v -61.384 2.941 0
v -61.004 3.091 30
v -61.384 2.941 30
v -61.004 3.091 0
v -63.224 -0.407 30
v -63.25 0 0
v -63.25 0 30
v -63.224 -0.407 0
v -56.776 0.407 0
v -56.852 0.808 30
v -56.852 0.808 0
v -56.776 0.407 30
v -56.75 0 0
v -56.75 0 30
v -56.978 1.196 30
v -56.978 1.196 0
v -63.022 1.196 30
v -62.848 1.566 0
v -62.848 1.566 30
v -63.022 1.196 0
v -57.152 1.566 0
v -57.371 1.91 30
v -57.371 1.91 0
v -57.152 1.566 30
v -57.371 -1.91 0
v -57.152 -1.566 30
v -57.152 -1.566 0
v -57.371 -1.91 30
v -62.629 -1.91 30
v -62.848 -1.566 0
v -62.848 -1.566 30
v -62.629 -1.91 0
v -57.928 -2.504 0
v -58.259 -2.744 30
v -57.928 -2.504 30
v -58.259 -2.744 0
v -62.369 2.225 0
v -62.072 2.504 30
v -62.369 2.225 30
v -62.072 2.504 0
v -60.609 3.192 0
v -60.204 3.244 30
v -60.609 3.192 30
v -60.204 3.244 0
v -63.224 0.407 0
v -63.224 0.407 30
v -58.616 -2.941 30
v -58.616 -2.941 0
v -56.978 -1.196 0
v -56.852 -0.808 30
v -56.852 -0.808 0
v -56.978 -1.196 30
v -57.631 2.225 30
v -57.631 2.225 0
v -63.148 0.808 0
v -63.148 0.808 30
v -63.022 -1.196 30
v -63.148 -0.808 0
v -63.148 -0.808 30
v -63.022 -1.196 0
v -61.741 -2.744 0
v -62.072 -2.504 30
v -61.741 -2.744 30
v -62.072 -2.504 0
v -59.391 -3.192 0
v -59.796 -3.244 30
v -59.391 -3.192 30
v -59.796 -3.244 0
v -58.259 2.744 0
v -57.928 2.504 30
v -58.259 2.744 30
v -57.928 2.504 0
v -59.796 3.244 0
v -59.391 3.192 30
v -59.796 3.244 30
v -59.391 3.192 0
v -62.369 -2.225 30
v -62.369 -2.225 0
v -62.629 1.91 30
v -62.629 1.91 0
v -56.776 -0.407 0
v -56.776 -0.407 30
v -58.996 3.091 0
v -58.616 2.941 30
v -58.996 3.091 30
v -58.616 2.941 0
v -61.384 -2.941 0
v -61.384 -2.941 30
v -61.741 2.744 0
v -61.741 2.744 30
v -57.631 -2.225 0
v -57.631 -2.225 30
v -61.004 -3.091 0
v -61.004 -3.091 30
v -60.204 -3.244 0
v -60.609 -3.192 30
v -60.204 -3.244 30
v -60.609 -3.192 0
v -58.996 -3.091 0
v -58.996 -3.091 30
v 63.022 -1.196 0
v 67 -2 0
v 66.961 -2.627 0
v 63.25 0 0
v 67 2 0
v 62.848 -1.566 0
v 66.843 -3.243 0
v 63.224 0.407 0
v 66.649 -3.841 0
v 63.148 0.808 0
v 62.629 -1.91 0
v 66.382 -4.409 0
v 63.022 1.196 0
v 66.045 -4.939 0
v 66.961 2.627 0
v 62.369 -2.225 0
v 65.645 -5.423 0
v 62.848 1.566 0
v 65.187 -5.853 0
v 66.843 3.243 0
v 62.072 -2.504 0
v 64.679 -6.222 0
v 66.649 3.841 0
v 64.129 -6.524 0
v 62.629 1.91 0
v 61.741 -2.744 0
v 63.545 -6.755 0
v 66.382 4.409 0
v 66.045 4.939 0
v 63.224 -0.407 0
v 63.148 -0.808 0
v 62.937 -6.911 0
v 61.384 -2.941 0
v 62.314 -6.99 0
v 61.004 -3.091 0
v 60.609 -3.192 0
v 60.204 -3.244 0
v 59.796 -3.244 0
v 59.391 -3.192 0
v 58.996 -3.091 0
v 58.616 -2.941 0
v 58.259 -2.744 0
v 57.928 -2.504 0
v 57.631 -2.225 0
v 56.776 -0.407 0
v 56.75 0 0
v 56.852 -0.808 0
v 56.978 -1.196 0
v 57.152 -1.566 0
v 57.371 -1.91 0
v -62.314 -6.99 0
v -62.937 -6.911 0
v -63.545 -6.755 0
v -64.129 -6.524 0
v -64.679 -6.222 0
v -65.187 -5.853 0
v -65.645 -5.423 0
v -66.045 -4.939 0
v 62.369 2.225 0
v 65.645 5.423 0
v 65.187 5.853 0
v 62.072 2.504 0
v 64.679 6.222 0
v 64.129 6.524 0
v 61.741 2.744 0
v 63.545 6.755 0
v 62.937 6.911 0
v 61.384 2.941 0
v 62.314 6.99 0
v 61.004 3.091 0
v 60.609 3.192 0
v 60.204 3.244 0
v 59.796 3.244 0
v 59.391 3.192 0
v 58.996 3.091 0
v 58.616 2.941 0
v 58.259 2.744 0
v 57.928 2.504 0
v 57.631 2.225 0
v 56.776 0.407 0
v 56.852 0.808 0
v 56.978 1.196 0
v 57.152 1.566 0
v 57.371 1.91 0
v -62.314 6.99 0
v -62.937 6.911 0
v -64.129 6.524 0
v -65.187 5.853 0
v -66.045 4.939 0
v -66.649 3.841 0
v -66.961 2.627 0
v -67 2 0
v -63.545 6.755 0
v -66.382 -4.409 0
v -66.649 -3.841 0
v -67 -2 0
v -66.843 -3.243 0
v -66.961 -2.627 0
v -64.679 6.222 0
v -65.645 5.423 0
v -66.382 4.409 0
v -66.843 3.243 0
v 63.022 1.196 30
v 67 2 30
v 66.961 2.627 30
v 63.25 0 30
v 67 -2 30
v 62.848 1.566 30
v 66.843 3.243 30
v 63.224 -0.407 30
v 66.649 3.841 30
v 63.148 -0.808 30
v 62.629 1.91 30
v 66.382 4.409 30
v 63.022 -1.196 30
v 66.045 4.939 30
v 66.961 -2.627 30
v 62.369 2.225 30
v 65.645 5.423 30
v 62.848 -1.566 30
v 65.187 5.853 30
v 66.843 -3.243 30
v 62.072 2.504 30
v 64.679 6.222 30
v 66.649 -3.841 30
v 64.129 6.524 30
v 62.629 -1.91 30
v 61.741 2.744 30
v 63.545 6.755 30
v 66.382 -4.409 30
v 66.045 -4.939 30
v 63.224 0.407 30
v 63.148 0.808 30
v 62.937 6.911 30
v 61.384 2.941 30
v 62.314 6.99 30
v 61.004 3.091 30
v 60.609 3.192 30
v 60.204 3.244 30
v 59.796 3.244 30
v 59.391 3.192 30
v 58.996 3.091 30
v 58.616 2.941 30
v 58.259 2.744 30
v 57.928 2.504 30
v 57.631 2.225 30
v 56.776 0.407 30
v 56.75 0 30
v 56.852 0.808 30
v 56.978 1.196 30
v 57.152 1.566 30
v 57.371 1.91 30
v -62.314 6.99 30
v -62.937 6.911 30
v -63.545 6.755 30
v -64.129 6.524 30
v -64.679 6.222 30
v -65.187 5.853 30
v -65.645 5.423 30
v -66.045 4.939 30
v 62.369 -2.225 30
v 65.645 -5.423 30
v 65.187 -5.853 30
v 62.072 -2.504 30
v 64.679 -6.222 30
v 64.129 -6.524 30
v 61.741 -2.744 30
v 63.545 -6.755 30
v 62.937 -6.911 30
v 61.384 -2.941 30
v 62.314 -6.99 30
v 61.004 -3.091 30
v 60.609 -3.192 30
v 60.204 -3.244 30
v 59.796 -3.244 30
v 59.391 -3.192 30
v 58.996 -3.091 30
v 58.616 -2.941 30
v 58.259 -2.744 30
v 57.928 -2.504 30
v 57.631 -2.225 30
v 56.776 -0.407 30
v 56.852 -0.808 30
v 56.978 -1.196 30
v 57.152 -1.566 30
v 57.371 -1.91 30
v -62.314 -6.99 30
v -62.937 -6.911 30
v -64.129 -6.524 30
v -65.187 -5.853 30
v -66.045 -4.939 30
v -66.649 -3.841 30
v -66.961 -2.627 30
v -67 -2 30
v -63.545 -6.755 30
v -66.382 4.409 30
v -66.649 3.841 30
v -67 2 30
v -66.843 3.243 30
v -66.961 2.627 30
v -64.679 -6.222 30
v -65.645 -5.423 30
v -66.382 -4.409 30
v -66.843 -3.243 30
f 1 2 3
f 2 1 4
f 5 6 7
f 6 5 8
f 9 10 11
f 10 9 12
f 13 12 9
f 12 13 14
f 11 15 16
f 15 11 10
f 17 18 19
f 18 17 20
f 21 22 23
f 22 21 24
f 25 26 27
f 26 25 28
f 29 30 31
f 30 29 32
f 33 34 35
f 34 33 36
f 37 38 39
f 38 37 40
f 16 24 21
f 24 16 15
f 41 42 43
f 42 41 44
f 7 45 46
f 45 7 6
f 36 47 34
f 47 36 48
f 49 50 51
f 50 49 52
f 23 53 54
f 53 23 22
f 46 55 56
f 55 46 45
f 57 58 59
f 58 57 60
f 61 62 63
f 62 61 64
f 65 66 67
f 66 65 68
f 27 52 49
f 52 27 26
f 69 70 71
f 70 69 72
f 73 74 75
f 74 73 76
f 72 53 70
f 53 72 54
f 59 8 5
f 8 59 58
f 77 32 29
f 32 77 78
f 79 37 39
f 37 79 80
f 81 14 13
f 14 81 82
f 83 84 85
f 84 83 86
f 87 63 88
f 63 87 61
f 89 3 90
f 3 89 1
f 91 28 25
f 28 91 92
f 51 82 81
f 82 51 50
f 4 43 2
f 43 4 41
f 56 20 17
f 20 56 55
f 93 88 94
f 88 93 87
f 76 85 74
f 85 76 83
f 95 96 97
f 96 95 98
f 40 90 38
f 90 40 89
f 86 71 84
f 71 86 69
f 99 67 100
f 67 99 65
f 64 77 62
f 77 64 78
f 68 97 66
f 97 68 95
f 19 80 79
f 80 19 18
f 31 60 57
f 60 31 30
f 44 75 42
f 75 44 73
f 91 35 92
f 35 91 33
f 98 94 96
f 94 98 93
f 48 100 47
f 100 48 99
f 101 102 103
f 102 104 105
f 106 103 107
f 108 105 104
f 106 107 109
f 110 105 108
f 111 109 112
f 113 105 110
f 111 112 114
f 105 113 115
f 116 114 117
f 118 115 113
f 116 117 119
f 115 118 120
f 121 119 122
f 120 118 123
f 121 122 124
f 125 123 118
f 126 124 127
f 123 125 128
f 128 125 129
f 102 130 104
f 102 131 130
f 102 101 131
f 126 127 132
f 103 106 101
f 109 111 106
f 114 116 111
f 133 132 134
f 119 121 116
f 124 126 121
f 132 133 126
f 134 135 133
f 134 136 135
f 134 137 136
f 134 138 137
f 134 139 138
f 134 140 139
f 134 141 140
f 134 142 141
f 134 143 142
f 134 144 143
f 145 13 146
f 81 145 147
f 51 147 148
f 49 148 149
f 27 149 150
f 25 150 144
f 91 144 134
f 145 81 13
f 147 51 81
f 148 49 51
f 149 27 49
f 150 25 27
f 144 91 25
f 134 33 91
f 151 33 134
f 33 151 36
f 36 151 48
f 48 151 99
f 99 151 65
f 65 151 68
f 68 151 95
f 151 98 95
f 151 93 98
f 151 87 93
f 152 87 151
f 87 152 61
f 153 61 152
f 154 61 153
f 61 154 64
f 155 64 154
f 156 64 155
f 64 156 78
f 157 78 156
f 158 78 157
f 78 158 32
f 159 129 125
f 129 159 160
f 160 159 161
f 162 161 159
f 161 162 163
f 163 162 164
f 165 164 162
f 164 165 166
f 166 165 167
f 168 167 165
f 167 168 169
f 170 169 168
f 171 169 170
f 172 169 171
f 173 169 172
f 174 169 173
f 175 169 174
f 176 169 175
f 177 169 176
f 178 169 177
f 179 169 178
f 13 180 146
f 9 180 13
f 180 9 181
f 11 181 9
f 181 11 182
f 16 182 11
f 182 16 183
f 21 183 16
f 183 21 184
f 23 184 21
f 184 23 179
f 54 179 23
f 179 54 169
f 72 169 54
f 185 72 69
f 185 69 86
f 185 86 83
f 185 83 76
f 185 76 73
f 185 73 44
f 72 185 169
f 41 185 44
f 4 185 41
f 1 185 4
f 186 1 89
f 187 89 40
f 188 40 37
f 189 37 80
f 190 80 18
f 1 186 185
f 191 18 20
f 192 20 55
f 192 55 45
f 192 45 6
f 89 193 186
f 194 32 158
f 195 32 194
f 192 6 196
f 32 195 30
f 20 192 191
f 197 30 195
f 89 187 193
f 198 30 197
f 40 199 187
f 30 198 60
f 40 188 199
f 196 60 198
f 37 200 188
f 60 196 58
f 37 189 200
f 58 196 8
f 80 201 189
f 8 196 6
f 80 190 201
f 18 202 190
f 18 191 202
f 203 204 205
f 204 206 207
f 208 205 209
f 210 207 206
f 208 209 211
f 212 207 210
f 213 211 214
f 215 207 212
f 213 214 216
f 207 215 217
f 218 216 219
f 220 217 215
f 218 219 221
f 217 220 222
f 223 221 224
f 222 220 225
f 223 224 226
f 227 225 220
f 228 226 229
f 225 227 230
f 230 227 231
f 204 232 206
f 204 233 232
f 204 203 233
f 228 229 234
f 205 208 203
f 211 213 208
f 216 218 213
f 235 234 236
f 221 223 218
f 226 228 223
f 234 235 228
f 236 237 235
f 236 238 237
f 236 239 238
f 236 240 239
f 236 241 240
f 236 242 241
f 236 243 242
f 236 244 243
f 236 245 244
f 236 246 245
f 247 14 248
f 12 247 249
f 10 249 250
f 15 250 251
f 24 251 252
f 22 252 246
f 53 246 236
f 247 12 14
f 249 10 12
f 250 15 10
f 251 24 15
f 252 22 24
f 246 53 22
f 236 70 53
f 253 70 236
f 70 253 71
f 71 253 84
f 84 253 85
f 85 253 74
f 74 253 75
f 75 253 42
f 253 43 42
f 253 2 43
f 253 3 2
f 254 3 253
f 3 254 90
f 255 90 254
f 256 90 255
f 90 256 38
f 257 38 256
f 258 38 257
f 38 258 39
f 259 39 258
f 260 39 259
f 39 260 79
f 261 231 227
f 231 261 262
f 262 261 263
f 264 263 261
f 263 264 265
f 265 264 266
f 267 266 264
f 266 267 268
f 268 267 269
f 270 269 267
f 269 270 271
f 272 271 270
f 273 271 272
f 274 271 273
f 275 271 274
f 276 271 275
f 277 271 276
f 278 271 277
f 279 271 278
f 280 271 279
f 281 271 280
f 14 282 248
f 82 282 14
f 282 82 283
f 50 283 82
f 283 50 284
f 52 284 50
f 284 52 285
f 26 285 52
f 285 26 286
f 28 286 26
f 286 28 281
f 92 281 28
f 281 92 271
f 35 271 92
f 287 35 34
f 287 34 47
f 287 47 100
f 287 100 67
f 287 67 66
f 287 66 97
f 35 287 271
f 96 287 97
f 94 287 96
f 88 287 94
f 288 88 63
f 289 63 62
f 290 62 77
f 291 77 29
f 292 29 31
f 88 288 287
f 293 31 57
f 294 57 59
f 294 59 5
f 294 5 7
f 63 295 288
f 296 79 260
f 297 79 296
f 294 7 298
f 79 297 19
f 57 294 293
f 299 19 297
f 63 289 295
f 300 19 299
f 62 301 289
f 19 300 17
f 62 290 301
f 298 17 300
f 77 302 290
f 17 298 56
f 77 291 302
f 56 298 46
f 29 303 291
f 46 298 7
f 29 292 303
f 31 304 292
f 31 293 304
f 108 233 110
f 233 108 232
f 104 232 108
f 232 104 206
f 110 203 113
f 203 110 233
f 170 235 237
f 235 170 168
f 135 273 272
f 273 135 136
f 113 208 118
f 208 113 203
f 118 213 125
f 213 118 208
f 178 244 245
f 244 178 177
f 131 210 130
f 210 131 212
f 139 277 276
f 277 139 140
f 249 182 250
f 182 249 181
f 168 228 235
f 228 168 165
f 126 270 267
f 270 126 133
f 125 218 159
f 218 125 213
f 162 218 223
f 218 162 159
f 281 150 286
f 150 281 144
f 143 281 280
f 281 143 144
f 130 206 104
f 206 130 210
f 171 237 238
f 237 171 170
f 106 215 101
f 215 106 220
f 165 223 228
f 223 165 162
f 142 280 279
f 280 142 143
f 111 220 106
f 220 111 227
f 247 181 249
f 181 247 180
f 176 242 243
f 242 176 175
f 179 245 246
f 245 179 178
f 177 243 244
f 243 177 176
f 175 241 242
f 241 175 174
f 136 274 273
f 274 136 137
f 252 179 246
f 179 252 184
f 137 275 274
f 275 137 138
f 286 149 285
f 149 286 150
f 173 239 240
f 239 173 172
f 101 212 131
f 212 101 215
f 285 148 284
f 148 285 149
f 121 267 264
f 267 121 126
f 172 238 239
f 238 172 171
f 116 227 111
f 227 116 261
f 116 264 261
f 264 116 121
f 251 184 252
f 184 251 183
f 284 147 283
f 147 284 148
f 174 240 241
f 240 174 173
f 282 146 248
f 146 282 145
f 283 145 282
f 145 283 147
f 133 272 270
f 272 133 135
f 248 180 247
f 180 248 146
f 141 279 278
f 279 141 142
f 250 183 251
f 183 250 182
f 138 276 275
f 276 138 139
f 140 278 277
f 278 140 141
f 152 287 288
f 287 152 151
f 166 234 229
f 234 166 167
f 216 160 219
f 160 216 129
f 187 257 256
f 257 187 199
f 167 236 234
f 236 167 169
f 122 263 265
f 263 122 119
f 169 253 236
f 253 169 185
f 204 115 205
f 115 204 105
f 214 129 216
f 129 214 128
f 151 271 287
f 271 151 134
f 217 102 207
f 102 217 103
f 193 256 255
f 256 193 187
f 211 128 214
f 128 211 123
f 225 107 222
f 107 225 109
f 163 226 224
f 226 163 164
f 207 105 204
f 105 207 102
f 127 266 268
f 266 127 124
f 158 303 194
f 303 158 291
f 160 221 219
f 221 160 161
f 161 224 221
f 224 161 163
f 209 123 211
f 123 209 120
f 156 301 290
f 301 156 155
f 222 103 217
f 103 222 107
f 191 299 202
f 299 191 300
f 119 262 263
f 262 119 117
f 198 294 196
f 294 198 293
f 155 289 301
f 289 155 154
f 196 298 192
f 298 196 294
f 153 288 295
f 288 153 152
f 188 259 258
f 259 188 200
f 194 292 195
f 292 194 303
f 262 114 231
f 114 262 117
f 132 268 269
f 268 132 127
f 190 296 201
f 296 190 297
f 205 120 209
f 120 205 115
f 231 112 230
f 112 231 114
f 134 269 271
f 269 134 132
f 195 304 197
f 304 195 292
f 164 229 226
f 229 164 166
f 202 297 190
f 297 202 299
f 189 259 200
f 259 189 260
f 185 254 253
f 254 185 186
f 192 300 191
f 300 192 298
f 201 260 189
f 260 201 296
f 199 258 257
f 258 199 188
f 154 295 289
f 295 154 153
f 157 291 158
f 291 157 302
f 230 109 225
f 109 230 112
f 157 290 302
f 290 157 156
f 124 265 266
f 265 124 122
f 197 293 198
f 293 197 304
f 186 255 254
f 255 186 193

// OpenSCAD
$fn = 50;


difference() {
	union() {
		hull() {
			translate(v = [-62.0000000000, 2.0000000000, 0]) {
				cylinder(h = 30, r = 5);
			}
			translate(v = [62.0000000000, 2.0000000000, 0]) {
				cylinder(h = 30, r = 5);
			}
			translate(v = [-62.0000000000, -2.0000000000, 0]) {
				cylinder(h = 30, r = 5);
			}
			translate(v = [62.0000000000, -2.0000000000, 0]) {
				cylinder(h = 30, r = 5);
			}
		}
	}
	union() {
		translate(v = [-60.0000000000, 0.0000000000, 0]) {
			cylinder(h = 30, r = 3.2500000000);
		}
		translate(v = [60.0000000000, 0.0000000000, 0]) {
			cylinder(h = 30, r = 3.2500000000);
		}
		translate(v = [-60.0000000000, 0.0000000000, 0]) {
			cylinder(h = 30, r = 1.8000000000);
		}
		translate(v = [60.0000000000, 0.0000000000, 0]) {
			cylinder(h = 30, r = 1.8000000000);
		}
		translate(v = [-60.0000000000, 0.0000000000, 0]) {
			cylinder(h = 30, r = 1.8000000000);
		}
		translate(v = [60.0000000000, 0.0000000000, 0]) {
			cylinder(h = 30, r = 1.8000000000);
		}
		translate(v = [-60.0000000000, 0.0000000000, 0]) {
			cylinder(h = 30, r = 1.8000000000);
		}
		translate(v = [60.0000000000, 0.0000000000, 0]) {
			cylinder(h = 30, r = 1.8000000000);
		}
	}
}
